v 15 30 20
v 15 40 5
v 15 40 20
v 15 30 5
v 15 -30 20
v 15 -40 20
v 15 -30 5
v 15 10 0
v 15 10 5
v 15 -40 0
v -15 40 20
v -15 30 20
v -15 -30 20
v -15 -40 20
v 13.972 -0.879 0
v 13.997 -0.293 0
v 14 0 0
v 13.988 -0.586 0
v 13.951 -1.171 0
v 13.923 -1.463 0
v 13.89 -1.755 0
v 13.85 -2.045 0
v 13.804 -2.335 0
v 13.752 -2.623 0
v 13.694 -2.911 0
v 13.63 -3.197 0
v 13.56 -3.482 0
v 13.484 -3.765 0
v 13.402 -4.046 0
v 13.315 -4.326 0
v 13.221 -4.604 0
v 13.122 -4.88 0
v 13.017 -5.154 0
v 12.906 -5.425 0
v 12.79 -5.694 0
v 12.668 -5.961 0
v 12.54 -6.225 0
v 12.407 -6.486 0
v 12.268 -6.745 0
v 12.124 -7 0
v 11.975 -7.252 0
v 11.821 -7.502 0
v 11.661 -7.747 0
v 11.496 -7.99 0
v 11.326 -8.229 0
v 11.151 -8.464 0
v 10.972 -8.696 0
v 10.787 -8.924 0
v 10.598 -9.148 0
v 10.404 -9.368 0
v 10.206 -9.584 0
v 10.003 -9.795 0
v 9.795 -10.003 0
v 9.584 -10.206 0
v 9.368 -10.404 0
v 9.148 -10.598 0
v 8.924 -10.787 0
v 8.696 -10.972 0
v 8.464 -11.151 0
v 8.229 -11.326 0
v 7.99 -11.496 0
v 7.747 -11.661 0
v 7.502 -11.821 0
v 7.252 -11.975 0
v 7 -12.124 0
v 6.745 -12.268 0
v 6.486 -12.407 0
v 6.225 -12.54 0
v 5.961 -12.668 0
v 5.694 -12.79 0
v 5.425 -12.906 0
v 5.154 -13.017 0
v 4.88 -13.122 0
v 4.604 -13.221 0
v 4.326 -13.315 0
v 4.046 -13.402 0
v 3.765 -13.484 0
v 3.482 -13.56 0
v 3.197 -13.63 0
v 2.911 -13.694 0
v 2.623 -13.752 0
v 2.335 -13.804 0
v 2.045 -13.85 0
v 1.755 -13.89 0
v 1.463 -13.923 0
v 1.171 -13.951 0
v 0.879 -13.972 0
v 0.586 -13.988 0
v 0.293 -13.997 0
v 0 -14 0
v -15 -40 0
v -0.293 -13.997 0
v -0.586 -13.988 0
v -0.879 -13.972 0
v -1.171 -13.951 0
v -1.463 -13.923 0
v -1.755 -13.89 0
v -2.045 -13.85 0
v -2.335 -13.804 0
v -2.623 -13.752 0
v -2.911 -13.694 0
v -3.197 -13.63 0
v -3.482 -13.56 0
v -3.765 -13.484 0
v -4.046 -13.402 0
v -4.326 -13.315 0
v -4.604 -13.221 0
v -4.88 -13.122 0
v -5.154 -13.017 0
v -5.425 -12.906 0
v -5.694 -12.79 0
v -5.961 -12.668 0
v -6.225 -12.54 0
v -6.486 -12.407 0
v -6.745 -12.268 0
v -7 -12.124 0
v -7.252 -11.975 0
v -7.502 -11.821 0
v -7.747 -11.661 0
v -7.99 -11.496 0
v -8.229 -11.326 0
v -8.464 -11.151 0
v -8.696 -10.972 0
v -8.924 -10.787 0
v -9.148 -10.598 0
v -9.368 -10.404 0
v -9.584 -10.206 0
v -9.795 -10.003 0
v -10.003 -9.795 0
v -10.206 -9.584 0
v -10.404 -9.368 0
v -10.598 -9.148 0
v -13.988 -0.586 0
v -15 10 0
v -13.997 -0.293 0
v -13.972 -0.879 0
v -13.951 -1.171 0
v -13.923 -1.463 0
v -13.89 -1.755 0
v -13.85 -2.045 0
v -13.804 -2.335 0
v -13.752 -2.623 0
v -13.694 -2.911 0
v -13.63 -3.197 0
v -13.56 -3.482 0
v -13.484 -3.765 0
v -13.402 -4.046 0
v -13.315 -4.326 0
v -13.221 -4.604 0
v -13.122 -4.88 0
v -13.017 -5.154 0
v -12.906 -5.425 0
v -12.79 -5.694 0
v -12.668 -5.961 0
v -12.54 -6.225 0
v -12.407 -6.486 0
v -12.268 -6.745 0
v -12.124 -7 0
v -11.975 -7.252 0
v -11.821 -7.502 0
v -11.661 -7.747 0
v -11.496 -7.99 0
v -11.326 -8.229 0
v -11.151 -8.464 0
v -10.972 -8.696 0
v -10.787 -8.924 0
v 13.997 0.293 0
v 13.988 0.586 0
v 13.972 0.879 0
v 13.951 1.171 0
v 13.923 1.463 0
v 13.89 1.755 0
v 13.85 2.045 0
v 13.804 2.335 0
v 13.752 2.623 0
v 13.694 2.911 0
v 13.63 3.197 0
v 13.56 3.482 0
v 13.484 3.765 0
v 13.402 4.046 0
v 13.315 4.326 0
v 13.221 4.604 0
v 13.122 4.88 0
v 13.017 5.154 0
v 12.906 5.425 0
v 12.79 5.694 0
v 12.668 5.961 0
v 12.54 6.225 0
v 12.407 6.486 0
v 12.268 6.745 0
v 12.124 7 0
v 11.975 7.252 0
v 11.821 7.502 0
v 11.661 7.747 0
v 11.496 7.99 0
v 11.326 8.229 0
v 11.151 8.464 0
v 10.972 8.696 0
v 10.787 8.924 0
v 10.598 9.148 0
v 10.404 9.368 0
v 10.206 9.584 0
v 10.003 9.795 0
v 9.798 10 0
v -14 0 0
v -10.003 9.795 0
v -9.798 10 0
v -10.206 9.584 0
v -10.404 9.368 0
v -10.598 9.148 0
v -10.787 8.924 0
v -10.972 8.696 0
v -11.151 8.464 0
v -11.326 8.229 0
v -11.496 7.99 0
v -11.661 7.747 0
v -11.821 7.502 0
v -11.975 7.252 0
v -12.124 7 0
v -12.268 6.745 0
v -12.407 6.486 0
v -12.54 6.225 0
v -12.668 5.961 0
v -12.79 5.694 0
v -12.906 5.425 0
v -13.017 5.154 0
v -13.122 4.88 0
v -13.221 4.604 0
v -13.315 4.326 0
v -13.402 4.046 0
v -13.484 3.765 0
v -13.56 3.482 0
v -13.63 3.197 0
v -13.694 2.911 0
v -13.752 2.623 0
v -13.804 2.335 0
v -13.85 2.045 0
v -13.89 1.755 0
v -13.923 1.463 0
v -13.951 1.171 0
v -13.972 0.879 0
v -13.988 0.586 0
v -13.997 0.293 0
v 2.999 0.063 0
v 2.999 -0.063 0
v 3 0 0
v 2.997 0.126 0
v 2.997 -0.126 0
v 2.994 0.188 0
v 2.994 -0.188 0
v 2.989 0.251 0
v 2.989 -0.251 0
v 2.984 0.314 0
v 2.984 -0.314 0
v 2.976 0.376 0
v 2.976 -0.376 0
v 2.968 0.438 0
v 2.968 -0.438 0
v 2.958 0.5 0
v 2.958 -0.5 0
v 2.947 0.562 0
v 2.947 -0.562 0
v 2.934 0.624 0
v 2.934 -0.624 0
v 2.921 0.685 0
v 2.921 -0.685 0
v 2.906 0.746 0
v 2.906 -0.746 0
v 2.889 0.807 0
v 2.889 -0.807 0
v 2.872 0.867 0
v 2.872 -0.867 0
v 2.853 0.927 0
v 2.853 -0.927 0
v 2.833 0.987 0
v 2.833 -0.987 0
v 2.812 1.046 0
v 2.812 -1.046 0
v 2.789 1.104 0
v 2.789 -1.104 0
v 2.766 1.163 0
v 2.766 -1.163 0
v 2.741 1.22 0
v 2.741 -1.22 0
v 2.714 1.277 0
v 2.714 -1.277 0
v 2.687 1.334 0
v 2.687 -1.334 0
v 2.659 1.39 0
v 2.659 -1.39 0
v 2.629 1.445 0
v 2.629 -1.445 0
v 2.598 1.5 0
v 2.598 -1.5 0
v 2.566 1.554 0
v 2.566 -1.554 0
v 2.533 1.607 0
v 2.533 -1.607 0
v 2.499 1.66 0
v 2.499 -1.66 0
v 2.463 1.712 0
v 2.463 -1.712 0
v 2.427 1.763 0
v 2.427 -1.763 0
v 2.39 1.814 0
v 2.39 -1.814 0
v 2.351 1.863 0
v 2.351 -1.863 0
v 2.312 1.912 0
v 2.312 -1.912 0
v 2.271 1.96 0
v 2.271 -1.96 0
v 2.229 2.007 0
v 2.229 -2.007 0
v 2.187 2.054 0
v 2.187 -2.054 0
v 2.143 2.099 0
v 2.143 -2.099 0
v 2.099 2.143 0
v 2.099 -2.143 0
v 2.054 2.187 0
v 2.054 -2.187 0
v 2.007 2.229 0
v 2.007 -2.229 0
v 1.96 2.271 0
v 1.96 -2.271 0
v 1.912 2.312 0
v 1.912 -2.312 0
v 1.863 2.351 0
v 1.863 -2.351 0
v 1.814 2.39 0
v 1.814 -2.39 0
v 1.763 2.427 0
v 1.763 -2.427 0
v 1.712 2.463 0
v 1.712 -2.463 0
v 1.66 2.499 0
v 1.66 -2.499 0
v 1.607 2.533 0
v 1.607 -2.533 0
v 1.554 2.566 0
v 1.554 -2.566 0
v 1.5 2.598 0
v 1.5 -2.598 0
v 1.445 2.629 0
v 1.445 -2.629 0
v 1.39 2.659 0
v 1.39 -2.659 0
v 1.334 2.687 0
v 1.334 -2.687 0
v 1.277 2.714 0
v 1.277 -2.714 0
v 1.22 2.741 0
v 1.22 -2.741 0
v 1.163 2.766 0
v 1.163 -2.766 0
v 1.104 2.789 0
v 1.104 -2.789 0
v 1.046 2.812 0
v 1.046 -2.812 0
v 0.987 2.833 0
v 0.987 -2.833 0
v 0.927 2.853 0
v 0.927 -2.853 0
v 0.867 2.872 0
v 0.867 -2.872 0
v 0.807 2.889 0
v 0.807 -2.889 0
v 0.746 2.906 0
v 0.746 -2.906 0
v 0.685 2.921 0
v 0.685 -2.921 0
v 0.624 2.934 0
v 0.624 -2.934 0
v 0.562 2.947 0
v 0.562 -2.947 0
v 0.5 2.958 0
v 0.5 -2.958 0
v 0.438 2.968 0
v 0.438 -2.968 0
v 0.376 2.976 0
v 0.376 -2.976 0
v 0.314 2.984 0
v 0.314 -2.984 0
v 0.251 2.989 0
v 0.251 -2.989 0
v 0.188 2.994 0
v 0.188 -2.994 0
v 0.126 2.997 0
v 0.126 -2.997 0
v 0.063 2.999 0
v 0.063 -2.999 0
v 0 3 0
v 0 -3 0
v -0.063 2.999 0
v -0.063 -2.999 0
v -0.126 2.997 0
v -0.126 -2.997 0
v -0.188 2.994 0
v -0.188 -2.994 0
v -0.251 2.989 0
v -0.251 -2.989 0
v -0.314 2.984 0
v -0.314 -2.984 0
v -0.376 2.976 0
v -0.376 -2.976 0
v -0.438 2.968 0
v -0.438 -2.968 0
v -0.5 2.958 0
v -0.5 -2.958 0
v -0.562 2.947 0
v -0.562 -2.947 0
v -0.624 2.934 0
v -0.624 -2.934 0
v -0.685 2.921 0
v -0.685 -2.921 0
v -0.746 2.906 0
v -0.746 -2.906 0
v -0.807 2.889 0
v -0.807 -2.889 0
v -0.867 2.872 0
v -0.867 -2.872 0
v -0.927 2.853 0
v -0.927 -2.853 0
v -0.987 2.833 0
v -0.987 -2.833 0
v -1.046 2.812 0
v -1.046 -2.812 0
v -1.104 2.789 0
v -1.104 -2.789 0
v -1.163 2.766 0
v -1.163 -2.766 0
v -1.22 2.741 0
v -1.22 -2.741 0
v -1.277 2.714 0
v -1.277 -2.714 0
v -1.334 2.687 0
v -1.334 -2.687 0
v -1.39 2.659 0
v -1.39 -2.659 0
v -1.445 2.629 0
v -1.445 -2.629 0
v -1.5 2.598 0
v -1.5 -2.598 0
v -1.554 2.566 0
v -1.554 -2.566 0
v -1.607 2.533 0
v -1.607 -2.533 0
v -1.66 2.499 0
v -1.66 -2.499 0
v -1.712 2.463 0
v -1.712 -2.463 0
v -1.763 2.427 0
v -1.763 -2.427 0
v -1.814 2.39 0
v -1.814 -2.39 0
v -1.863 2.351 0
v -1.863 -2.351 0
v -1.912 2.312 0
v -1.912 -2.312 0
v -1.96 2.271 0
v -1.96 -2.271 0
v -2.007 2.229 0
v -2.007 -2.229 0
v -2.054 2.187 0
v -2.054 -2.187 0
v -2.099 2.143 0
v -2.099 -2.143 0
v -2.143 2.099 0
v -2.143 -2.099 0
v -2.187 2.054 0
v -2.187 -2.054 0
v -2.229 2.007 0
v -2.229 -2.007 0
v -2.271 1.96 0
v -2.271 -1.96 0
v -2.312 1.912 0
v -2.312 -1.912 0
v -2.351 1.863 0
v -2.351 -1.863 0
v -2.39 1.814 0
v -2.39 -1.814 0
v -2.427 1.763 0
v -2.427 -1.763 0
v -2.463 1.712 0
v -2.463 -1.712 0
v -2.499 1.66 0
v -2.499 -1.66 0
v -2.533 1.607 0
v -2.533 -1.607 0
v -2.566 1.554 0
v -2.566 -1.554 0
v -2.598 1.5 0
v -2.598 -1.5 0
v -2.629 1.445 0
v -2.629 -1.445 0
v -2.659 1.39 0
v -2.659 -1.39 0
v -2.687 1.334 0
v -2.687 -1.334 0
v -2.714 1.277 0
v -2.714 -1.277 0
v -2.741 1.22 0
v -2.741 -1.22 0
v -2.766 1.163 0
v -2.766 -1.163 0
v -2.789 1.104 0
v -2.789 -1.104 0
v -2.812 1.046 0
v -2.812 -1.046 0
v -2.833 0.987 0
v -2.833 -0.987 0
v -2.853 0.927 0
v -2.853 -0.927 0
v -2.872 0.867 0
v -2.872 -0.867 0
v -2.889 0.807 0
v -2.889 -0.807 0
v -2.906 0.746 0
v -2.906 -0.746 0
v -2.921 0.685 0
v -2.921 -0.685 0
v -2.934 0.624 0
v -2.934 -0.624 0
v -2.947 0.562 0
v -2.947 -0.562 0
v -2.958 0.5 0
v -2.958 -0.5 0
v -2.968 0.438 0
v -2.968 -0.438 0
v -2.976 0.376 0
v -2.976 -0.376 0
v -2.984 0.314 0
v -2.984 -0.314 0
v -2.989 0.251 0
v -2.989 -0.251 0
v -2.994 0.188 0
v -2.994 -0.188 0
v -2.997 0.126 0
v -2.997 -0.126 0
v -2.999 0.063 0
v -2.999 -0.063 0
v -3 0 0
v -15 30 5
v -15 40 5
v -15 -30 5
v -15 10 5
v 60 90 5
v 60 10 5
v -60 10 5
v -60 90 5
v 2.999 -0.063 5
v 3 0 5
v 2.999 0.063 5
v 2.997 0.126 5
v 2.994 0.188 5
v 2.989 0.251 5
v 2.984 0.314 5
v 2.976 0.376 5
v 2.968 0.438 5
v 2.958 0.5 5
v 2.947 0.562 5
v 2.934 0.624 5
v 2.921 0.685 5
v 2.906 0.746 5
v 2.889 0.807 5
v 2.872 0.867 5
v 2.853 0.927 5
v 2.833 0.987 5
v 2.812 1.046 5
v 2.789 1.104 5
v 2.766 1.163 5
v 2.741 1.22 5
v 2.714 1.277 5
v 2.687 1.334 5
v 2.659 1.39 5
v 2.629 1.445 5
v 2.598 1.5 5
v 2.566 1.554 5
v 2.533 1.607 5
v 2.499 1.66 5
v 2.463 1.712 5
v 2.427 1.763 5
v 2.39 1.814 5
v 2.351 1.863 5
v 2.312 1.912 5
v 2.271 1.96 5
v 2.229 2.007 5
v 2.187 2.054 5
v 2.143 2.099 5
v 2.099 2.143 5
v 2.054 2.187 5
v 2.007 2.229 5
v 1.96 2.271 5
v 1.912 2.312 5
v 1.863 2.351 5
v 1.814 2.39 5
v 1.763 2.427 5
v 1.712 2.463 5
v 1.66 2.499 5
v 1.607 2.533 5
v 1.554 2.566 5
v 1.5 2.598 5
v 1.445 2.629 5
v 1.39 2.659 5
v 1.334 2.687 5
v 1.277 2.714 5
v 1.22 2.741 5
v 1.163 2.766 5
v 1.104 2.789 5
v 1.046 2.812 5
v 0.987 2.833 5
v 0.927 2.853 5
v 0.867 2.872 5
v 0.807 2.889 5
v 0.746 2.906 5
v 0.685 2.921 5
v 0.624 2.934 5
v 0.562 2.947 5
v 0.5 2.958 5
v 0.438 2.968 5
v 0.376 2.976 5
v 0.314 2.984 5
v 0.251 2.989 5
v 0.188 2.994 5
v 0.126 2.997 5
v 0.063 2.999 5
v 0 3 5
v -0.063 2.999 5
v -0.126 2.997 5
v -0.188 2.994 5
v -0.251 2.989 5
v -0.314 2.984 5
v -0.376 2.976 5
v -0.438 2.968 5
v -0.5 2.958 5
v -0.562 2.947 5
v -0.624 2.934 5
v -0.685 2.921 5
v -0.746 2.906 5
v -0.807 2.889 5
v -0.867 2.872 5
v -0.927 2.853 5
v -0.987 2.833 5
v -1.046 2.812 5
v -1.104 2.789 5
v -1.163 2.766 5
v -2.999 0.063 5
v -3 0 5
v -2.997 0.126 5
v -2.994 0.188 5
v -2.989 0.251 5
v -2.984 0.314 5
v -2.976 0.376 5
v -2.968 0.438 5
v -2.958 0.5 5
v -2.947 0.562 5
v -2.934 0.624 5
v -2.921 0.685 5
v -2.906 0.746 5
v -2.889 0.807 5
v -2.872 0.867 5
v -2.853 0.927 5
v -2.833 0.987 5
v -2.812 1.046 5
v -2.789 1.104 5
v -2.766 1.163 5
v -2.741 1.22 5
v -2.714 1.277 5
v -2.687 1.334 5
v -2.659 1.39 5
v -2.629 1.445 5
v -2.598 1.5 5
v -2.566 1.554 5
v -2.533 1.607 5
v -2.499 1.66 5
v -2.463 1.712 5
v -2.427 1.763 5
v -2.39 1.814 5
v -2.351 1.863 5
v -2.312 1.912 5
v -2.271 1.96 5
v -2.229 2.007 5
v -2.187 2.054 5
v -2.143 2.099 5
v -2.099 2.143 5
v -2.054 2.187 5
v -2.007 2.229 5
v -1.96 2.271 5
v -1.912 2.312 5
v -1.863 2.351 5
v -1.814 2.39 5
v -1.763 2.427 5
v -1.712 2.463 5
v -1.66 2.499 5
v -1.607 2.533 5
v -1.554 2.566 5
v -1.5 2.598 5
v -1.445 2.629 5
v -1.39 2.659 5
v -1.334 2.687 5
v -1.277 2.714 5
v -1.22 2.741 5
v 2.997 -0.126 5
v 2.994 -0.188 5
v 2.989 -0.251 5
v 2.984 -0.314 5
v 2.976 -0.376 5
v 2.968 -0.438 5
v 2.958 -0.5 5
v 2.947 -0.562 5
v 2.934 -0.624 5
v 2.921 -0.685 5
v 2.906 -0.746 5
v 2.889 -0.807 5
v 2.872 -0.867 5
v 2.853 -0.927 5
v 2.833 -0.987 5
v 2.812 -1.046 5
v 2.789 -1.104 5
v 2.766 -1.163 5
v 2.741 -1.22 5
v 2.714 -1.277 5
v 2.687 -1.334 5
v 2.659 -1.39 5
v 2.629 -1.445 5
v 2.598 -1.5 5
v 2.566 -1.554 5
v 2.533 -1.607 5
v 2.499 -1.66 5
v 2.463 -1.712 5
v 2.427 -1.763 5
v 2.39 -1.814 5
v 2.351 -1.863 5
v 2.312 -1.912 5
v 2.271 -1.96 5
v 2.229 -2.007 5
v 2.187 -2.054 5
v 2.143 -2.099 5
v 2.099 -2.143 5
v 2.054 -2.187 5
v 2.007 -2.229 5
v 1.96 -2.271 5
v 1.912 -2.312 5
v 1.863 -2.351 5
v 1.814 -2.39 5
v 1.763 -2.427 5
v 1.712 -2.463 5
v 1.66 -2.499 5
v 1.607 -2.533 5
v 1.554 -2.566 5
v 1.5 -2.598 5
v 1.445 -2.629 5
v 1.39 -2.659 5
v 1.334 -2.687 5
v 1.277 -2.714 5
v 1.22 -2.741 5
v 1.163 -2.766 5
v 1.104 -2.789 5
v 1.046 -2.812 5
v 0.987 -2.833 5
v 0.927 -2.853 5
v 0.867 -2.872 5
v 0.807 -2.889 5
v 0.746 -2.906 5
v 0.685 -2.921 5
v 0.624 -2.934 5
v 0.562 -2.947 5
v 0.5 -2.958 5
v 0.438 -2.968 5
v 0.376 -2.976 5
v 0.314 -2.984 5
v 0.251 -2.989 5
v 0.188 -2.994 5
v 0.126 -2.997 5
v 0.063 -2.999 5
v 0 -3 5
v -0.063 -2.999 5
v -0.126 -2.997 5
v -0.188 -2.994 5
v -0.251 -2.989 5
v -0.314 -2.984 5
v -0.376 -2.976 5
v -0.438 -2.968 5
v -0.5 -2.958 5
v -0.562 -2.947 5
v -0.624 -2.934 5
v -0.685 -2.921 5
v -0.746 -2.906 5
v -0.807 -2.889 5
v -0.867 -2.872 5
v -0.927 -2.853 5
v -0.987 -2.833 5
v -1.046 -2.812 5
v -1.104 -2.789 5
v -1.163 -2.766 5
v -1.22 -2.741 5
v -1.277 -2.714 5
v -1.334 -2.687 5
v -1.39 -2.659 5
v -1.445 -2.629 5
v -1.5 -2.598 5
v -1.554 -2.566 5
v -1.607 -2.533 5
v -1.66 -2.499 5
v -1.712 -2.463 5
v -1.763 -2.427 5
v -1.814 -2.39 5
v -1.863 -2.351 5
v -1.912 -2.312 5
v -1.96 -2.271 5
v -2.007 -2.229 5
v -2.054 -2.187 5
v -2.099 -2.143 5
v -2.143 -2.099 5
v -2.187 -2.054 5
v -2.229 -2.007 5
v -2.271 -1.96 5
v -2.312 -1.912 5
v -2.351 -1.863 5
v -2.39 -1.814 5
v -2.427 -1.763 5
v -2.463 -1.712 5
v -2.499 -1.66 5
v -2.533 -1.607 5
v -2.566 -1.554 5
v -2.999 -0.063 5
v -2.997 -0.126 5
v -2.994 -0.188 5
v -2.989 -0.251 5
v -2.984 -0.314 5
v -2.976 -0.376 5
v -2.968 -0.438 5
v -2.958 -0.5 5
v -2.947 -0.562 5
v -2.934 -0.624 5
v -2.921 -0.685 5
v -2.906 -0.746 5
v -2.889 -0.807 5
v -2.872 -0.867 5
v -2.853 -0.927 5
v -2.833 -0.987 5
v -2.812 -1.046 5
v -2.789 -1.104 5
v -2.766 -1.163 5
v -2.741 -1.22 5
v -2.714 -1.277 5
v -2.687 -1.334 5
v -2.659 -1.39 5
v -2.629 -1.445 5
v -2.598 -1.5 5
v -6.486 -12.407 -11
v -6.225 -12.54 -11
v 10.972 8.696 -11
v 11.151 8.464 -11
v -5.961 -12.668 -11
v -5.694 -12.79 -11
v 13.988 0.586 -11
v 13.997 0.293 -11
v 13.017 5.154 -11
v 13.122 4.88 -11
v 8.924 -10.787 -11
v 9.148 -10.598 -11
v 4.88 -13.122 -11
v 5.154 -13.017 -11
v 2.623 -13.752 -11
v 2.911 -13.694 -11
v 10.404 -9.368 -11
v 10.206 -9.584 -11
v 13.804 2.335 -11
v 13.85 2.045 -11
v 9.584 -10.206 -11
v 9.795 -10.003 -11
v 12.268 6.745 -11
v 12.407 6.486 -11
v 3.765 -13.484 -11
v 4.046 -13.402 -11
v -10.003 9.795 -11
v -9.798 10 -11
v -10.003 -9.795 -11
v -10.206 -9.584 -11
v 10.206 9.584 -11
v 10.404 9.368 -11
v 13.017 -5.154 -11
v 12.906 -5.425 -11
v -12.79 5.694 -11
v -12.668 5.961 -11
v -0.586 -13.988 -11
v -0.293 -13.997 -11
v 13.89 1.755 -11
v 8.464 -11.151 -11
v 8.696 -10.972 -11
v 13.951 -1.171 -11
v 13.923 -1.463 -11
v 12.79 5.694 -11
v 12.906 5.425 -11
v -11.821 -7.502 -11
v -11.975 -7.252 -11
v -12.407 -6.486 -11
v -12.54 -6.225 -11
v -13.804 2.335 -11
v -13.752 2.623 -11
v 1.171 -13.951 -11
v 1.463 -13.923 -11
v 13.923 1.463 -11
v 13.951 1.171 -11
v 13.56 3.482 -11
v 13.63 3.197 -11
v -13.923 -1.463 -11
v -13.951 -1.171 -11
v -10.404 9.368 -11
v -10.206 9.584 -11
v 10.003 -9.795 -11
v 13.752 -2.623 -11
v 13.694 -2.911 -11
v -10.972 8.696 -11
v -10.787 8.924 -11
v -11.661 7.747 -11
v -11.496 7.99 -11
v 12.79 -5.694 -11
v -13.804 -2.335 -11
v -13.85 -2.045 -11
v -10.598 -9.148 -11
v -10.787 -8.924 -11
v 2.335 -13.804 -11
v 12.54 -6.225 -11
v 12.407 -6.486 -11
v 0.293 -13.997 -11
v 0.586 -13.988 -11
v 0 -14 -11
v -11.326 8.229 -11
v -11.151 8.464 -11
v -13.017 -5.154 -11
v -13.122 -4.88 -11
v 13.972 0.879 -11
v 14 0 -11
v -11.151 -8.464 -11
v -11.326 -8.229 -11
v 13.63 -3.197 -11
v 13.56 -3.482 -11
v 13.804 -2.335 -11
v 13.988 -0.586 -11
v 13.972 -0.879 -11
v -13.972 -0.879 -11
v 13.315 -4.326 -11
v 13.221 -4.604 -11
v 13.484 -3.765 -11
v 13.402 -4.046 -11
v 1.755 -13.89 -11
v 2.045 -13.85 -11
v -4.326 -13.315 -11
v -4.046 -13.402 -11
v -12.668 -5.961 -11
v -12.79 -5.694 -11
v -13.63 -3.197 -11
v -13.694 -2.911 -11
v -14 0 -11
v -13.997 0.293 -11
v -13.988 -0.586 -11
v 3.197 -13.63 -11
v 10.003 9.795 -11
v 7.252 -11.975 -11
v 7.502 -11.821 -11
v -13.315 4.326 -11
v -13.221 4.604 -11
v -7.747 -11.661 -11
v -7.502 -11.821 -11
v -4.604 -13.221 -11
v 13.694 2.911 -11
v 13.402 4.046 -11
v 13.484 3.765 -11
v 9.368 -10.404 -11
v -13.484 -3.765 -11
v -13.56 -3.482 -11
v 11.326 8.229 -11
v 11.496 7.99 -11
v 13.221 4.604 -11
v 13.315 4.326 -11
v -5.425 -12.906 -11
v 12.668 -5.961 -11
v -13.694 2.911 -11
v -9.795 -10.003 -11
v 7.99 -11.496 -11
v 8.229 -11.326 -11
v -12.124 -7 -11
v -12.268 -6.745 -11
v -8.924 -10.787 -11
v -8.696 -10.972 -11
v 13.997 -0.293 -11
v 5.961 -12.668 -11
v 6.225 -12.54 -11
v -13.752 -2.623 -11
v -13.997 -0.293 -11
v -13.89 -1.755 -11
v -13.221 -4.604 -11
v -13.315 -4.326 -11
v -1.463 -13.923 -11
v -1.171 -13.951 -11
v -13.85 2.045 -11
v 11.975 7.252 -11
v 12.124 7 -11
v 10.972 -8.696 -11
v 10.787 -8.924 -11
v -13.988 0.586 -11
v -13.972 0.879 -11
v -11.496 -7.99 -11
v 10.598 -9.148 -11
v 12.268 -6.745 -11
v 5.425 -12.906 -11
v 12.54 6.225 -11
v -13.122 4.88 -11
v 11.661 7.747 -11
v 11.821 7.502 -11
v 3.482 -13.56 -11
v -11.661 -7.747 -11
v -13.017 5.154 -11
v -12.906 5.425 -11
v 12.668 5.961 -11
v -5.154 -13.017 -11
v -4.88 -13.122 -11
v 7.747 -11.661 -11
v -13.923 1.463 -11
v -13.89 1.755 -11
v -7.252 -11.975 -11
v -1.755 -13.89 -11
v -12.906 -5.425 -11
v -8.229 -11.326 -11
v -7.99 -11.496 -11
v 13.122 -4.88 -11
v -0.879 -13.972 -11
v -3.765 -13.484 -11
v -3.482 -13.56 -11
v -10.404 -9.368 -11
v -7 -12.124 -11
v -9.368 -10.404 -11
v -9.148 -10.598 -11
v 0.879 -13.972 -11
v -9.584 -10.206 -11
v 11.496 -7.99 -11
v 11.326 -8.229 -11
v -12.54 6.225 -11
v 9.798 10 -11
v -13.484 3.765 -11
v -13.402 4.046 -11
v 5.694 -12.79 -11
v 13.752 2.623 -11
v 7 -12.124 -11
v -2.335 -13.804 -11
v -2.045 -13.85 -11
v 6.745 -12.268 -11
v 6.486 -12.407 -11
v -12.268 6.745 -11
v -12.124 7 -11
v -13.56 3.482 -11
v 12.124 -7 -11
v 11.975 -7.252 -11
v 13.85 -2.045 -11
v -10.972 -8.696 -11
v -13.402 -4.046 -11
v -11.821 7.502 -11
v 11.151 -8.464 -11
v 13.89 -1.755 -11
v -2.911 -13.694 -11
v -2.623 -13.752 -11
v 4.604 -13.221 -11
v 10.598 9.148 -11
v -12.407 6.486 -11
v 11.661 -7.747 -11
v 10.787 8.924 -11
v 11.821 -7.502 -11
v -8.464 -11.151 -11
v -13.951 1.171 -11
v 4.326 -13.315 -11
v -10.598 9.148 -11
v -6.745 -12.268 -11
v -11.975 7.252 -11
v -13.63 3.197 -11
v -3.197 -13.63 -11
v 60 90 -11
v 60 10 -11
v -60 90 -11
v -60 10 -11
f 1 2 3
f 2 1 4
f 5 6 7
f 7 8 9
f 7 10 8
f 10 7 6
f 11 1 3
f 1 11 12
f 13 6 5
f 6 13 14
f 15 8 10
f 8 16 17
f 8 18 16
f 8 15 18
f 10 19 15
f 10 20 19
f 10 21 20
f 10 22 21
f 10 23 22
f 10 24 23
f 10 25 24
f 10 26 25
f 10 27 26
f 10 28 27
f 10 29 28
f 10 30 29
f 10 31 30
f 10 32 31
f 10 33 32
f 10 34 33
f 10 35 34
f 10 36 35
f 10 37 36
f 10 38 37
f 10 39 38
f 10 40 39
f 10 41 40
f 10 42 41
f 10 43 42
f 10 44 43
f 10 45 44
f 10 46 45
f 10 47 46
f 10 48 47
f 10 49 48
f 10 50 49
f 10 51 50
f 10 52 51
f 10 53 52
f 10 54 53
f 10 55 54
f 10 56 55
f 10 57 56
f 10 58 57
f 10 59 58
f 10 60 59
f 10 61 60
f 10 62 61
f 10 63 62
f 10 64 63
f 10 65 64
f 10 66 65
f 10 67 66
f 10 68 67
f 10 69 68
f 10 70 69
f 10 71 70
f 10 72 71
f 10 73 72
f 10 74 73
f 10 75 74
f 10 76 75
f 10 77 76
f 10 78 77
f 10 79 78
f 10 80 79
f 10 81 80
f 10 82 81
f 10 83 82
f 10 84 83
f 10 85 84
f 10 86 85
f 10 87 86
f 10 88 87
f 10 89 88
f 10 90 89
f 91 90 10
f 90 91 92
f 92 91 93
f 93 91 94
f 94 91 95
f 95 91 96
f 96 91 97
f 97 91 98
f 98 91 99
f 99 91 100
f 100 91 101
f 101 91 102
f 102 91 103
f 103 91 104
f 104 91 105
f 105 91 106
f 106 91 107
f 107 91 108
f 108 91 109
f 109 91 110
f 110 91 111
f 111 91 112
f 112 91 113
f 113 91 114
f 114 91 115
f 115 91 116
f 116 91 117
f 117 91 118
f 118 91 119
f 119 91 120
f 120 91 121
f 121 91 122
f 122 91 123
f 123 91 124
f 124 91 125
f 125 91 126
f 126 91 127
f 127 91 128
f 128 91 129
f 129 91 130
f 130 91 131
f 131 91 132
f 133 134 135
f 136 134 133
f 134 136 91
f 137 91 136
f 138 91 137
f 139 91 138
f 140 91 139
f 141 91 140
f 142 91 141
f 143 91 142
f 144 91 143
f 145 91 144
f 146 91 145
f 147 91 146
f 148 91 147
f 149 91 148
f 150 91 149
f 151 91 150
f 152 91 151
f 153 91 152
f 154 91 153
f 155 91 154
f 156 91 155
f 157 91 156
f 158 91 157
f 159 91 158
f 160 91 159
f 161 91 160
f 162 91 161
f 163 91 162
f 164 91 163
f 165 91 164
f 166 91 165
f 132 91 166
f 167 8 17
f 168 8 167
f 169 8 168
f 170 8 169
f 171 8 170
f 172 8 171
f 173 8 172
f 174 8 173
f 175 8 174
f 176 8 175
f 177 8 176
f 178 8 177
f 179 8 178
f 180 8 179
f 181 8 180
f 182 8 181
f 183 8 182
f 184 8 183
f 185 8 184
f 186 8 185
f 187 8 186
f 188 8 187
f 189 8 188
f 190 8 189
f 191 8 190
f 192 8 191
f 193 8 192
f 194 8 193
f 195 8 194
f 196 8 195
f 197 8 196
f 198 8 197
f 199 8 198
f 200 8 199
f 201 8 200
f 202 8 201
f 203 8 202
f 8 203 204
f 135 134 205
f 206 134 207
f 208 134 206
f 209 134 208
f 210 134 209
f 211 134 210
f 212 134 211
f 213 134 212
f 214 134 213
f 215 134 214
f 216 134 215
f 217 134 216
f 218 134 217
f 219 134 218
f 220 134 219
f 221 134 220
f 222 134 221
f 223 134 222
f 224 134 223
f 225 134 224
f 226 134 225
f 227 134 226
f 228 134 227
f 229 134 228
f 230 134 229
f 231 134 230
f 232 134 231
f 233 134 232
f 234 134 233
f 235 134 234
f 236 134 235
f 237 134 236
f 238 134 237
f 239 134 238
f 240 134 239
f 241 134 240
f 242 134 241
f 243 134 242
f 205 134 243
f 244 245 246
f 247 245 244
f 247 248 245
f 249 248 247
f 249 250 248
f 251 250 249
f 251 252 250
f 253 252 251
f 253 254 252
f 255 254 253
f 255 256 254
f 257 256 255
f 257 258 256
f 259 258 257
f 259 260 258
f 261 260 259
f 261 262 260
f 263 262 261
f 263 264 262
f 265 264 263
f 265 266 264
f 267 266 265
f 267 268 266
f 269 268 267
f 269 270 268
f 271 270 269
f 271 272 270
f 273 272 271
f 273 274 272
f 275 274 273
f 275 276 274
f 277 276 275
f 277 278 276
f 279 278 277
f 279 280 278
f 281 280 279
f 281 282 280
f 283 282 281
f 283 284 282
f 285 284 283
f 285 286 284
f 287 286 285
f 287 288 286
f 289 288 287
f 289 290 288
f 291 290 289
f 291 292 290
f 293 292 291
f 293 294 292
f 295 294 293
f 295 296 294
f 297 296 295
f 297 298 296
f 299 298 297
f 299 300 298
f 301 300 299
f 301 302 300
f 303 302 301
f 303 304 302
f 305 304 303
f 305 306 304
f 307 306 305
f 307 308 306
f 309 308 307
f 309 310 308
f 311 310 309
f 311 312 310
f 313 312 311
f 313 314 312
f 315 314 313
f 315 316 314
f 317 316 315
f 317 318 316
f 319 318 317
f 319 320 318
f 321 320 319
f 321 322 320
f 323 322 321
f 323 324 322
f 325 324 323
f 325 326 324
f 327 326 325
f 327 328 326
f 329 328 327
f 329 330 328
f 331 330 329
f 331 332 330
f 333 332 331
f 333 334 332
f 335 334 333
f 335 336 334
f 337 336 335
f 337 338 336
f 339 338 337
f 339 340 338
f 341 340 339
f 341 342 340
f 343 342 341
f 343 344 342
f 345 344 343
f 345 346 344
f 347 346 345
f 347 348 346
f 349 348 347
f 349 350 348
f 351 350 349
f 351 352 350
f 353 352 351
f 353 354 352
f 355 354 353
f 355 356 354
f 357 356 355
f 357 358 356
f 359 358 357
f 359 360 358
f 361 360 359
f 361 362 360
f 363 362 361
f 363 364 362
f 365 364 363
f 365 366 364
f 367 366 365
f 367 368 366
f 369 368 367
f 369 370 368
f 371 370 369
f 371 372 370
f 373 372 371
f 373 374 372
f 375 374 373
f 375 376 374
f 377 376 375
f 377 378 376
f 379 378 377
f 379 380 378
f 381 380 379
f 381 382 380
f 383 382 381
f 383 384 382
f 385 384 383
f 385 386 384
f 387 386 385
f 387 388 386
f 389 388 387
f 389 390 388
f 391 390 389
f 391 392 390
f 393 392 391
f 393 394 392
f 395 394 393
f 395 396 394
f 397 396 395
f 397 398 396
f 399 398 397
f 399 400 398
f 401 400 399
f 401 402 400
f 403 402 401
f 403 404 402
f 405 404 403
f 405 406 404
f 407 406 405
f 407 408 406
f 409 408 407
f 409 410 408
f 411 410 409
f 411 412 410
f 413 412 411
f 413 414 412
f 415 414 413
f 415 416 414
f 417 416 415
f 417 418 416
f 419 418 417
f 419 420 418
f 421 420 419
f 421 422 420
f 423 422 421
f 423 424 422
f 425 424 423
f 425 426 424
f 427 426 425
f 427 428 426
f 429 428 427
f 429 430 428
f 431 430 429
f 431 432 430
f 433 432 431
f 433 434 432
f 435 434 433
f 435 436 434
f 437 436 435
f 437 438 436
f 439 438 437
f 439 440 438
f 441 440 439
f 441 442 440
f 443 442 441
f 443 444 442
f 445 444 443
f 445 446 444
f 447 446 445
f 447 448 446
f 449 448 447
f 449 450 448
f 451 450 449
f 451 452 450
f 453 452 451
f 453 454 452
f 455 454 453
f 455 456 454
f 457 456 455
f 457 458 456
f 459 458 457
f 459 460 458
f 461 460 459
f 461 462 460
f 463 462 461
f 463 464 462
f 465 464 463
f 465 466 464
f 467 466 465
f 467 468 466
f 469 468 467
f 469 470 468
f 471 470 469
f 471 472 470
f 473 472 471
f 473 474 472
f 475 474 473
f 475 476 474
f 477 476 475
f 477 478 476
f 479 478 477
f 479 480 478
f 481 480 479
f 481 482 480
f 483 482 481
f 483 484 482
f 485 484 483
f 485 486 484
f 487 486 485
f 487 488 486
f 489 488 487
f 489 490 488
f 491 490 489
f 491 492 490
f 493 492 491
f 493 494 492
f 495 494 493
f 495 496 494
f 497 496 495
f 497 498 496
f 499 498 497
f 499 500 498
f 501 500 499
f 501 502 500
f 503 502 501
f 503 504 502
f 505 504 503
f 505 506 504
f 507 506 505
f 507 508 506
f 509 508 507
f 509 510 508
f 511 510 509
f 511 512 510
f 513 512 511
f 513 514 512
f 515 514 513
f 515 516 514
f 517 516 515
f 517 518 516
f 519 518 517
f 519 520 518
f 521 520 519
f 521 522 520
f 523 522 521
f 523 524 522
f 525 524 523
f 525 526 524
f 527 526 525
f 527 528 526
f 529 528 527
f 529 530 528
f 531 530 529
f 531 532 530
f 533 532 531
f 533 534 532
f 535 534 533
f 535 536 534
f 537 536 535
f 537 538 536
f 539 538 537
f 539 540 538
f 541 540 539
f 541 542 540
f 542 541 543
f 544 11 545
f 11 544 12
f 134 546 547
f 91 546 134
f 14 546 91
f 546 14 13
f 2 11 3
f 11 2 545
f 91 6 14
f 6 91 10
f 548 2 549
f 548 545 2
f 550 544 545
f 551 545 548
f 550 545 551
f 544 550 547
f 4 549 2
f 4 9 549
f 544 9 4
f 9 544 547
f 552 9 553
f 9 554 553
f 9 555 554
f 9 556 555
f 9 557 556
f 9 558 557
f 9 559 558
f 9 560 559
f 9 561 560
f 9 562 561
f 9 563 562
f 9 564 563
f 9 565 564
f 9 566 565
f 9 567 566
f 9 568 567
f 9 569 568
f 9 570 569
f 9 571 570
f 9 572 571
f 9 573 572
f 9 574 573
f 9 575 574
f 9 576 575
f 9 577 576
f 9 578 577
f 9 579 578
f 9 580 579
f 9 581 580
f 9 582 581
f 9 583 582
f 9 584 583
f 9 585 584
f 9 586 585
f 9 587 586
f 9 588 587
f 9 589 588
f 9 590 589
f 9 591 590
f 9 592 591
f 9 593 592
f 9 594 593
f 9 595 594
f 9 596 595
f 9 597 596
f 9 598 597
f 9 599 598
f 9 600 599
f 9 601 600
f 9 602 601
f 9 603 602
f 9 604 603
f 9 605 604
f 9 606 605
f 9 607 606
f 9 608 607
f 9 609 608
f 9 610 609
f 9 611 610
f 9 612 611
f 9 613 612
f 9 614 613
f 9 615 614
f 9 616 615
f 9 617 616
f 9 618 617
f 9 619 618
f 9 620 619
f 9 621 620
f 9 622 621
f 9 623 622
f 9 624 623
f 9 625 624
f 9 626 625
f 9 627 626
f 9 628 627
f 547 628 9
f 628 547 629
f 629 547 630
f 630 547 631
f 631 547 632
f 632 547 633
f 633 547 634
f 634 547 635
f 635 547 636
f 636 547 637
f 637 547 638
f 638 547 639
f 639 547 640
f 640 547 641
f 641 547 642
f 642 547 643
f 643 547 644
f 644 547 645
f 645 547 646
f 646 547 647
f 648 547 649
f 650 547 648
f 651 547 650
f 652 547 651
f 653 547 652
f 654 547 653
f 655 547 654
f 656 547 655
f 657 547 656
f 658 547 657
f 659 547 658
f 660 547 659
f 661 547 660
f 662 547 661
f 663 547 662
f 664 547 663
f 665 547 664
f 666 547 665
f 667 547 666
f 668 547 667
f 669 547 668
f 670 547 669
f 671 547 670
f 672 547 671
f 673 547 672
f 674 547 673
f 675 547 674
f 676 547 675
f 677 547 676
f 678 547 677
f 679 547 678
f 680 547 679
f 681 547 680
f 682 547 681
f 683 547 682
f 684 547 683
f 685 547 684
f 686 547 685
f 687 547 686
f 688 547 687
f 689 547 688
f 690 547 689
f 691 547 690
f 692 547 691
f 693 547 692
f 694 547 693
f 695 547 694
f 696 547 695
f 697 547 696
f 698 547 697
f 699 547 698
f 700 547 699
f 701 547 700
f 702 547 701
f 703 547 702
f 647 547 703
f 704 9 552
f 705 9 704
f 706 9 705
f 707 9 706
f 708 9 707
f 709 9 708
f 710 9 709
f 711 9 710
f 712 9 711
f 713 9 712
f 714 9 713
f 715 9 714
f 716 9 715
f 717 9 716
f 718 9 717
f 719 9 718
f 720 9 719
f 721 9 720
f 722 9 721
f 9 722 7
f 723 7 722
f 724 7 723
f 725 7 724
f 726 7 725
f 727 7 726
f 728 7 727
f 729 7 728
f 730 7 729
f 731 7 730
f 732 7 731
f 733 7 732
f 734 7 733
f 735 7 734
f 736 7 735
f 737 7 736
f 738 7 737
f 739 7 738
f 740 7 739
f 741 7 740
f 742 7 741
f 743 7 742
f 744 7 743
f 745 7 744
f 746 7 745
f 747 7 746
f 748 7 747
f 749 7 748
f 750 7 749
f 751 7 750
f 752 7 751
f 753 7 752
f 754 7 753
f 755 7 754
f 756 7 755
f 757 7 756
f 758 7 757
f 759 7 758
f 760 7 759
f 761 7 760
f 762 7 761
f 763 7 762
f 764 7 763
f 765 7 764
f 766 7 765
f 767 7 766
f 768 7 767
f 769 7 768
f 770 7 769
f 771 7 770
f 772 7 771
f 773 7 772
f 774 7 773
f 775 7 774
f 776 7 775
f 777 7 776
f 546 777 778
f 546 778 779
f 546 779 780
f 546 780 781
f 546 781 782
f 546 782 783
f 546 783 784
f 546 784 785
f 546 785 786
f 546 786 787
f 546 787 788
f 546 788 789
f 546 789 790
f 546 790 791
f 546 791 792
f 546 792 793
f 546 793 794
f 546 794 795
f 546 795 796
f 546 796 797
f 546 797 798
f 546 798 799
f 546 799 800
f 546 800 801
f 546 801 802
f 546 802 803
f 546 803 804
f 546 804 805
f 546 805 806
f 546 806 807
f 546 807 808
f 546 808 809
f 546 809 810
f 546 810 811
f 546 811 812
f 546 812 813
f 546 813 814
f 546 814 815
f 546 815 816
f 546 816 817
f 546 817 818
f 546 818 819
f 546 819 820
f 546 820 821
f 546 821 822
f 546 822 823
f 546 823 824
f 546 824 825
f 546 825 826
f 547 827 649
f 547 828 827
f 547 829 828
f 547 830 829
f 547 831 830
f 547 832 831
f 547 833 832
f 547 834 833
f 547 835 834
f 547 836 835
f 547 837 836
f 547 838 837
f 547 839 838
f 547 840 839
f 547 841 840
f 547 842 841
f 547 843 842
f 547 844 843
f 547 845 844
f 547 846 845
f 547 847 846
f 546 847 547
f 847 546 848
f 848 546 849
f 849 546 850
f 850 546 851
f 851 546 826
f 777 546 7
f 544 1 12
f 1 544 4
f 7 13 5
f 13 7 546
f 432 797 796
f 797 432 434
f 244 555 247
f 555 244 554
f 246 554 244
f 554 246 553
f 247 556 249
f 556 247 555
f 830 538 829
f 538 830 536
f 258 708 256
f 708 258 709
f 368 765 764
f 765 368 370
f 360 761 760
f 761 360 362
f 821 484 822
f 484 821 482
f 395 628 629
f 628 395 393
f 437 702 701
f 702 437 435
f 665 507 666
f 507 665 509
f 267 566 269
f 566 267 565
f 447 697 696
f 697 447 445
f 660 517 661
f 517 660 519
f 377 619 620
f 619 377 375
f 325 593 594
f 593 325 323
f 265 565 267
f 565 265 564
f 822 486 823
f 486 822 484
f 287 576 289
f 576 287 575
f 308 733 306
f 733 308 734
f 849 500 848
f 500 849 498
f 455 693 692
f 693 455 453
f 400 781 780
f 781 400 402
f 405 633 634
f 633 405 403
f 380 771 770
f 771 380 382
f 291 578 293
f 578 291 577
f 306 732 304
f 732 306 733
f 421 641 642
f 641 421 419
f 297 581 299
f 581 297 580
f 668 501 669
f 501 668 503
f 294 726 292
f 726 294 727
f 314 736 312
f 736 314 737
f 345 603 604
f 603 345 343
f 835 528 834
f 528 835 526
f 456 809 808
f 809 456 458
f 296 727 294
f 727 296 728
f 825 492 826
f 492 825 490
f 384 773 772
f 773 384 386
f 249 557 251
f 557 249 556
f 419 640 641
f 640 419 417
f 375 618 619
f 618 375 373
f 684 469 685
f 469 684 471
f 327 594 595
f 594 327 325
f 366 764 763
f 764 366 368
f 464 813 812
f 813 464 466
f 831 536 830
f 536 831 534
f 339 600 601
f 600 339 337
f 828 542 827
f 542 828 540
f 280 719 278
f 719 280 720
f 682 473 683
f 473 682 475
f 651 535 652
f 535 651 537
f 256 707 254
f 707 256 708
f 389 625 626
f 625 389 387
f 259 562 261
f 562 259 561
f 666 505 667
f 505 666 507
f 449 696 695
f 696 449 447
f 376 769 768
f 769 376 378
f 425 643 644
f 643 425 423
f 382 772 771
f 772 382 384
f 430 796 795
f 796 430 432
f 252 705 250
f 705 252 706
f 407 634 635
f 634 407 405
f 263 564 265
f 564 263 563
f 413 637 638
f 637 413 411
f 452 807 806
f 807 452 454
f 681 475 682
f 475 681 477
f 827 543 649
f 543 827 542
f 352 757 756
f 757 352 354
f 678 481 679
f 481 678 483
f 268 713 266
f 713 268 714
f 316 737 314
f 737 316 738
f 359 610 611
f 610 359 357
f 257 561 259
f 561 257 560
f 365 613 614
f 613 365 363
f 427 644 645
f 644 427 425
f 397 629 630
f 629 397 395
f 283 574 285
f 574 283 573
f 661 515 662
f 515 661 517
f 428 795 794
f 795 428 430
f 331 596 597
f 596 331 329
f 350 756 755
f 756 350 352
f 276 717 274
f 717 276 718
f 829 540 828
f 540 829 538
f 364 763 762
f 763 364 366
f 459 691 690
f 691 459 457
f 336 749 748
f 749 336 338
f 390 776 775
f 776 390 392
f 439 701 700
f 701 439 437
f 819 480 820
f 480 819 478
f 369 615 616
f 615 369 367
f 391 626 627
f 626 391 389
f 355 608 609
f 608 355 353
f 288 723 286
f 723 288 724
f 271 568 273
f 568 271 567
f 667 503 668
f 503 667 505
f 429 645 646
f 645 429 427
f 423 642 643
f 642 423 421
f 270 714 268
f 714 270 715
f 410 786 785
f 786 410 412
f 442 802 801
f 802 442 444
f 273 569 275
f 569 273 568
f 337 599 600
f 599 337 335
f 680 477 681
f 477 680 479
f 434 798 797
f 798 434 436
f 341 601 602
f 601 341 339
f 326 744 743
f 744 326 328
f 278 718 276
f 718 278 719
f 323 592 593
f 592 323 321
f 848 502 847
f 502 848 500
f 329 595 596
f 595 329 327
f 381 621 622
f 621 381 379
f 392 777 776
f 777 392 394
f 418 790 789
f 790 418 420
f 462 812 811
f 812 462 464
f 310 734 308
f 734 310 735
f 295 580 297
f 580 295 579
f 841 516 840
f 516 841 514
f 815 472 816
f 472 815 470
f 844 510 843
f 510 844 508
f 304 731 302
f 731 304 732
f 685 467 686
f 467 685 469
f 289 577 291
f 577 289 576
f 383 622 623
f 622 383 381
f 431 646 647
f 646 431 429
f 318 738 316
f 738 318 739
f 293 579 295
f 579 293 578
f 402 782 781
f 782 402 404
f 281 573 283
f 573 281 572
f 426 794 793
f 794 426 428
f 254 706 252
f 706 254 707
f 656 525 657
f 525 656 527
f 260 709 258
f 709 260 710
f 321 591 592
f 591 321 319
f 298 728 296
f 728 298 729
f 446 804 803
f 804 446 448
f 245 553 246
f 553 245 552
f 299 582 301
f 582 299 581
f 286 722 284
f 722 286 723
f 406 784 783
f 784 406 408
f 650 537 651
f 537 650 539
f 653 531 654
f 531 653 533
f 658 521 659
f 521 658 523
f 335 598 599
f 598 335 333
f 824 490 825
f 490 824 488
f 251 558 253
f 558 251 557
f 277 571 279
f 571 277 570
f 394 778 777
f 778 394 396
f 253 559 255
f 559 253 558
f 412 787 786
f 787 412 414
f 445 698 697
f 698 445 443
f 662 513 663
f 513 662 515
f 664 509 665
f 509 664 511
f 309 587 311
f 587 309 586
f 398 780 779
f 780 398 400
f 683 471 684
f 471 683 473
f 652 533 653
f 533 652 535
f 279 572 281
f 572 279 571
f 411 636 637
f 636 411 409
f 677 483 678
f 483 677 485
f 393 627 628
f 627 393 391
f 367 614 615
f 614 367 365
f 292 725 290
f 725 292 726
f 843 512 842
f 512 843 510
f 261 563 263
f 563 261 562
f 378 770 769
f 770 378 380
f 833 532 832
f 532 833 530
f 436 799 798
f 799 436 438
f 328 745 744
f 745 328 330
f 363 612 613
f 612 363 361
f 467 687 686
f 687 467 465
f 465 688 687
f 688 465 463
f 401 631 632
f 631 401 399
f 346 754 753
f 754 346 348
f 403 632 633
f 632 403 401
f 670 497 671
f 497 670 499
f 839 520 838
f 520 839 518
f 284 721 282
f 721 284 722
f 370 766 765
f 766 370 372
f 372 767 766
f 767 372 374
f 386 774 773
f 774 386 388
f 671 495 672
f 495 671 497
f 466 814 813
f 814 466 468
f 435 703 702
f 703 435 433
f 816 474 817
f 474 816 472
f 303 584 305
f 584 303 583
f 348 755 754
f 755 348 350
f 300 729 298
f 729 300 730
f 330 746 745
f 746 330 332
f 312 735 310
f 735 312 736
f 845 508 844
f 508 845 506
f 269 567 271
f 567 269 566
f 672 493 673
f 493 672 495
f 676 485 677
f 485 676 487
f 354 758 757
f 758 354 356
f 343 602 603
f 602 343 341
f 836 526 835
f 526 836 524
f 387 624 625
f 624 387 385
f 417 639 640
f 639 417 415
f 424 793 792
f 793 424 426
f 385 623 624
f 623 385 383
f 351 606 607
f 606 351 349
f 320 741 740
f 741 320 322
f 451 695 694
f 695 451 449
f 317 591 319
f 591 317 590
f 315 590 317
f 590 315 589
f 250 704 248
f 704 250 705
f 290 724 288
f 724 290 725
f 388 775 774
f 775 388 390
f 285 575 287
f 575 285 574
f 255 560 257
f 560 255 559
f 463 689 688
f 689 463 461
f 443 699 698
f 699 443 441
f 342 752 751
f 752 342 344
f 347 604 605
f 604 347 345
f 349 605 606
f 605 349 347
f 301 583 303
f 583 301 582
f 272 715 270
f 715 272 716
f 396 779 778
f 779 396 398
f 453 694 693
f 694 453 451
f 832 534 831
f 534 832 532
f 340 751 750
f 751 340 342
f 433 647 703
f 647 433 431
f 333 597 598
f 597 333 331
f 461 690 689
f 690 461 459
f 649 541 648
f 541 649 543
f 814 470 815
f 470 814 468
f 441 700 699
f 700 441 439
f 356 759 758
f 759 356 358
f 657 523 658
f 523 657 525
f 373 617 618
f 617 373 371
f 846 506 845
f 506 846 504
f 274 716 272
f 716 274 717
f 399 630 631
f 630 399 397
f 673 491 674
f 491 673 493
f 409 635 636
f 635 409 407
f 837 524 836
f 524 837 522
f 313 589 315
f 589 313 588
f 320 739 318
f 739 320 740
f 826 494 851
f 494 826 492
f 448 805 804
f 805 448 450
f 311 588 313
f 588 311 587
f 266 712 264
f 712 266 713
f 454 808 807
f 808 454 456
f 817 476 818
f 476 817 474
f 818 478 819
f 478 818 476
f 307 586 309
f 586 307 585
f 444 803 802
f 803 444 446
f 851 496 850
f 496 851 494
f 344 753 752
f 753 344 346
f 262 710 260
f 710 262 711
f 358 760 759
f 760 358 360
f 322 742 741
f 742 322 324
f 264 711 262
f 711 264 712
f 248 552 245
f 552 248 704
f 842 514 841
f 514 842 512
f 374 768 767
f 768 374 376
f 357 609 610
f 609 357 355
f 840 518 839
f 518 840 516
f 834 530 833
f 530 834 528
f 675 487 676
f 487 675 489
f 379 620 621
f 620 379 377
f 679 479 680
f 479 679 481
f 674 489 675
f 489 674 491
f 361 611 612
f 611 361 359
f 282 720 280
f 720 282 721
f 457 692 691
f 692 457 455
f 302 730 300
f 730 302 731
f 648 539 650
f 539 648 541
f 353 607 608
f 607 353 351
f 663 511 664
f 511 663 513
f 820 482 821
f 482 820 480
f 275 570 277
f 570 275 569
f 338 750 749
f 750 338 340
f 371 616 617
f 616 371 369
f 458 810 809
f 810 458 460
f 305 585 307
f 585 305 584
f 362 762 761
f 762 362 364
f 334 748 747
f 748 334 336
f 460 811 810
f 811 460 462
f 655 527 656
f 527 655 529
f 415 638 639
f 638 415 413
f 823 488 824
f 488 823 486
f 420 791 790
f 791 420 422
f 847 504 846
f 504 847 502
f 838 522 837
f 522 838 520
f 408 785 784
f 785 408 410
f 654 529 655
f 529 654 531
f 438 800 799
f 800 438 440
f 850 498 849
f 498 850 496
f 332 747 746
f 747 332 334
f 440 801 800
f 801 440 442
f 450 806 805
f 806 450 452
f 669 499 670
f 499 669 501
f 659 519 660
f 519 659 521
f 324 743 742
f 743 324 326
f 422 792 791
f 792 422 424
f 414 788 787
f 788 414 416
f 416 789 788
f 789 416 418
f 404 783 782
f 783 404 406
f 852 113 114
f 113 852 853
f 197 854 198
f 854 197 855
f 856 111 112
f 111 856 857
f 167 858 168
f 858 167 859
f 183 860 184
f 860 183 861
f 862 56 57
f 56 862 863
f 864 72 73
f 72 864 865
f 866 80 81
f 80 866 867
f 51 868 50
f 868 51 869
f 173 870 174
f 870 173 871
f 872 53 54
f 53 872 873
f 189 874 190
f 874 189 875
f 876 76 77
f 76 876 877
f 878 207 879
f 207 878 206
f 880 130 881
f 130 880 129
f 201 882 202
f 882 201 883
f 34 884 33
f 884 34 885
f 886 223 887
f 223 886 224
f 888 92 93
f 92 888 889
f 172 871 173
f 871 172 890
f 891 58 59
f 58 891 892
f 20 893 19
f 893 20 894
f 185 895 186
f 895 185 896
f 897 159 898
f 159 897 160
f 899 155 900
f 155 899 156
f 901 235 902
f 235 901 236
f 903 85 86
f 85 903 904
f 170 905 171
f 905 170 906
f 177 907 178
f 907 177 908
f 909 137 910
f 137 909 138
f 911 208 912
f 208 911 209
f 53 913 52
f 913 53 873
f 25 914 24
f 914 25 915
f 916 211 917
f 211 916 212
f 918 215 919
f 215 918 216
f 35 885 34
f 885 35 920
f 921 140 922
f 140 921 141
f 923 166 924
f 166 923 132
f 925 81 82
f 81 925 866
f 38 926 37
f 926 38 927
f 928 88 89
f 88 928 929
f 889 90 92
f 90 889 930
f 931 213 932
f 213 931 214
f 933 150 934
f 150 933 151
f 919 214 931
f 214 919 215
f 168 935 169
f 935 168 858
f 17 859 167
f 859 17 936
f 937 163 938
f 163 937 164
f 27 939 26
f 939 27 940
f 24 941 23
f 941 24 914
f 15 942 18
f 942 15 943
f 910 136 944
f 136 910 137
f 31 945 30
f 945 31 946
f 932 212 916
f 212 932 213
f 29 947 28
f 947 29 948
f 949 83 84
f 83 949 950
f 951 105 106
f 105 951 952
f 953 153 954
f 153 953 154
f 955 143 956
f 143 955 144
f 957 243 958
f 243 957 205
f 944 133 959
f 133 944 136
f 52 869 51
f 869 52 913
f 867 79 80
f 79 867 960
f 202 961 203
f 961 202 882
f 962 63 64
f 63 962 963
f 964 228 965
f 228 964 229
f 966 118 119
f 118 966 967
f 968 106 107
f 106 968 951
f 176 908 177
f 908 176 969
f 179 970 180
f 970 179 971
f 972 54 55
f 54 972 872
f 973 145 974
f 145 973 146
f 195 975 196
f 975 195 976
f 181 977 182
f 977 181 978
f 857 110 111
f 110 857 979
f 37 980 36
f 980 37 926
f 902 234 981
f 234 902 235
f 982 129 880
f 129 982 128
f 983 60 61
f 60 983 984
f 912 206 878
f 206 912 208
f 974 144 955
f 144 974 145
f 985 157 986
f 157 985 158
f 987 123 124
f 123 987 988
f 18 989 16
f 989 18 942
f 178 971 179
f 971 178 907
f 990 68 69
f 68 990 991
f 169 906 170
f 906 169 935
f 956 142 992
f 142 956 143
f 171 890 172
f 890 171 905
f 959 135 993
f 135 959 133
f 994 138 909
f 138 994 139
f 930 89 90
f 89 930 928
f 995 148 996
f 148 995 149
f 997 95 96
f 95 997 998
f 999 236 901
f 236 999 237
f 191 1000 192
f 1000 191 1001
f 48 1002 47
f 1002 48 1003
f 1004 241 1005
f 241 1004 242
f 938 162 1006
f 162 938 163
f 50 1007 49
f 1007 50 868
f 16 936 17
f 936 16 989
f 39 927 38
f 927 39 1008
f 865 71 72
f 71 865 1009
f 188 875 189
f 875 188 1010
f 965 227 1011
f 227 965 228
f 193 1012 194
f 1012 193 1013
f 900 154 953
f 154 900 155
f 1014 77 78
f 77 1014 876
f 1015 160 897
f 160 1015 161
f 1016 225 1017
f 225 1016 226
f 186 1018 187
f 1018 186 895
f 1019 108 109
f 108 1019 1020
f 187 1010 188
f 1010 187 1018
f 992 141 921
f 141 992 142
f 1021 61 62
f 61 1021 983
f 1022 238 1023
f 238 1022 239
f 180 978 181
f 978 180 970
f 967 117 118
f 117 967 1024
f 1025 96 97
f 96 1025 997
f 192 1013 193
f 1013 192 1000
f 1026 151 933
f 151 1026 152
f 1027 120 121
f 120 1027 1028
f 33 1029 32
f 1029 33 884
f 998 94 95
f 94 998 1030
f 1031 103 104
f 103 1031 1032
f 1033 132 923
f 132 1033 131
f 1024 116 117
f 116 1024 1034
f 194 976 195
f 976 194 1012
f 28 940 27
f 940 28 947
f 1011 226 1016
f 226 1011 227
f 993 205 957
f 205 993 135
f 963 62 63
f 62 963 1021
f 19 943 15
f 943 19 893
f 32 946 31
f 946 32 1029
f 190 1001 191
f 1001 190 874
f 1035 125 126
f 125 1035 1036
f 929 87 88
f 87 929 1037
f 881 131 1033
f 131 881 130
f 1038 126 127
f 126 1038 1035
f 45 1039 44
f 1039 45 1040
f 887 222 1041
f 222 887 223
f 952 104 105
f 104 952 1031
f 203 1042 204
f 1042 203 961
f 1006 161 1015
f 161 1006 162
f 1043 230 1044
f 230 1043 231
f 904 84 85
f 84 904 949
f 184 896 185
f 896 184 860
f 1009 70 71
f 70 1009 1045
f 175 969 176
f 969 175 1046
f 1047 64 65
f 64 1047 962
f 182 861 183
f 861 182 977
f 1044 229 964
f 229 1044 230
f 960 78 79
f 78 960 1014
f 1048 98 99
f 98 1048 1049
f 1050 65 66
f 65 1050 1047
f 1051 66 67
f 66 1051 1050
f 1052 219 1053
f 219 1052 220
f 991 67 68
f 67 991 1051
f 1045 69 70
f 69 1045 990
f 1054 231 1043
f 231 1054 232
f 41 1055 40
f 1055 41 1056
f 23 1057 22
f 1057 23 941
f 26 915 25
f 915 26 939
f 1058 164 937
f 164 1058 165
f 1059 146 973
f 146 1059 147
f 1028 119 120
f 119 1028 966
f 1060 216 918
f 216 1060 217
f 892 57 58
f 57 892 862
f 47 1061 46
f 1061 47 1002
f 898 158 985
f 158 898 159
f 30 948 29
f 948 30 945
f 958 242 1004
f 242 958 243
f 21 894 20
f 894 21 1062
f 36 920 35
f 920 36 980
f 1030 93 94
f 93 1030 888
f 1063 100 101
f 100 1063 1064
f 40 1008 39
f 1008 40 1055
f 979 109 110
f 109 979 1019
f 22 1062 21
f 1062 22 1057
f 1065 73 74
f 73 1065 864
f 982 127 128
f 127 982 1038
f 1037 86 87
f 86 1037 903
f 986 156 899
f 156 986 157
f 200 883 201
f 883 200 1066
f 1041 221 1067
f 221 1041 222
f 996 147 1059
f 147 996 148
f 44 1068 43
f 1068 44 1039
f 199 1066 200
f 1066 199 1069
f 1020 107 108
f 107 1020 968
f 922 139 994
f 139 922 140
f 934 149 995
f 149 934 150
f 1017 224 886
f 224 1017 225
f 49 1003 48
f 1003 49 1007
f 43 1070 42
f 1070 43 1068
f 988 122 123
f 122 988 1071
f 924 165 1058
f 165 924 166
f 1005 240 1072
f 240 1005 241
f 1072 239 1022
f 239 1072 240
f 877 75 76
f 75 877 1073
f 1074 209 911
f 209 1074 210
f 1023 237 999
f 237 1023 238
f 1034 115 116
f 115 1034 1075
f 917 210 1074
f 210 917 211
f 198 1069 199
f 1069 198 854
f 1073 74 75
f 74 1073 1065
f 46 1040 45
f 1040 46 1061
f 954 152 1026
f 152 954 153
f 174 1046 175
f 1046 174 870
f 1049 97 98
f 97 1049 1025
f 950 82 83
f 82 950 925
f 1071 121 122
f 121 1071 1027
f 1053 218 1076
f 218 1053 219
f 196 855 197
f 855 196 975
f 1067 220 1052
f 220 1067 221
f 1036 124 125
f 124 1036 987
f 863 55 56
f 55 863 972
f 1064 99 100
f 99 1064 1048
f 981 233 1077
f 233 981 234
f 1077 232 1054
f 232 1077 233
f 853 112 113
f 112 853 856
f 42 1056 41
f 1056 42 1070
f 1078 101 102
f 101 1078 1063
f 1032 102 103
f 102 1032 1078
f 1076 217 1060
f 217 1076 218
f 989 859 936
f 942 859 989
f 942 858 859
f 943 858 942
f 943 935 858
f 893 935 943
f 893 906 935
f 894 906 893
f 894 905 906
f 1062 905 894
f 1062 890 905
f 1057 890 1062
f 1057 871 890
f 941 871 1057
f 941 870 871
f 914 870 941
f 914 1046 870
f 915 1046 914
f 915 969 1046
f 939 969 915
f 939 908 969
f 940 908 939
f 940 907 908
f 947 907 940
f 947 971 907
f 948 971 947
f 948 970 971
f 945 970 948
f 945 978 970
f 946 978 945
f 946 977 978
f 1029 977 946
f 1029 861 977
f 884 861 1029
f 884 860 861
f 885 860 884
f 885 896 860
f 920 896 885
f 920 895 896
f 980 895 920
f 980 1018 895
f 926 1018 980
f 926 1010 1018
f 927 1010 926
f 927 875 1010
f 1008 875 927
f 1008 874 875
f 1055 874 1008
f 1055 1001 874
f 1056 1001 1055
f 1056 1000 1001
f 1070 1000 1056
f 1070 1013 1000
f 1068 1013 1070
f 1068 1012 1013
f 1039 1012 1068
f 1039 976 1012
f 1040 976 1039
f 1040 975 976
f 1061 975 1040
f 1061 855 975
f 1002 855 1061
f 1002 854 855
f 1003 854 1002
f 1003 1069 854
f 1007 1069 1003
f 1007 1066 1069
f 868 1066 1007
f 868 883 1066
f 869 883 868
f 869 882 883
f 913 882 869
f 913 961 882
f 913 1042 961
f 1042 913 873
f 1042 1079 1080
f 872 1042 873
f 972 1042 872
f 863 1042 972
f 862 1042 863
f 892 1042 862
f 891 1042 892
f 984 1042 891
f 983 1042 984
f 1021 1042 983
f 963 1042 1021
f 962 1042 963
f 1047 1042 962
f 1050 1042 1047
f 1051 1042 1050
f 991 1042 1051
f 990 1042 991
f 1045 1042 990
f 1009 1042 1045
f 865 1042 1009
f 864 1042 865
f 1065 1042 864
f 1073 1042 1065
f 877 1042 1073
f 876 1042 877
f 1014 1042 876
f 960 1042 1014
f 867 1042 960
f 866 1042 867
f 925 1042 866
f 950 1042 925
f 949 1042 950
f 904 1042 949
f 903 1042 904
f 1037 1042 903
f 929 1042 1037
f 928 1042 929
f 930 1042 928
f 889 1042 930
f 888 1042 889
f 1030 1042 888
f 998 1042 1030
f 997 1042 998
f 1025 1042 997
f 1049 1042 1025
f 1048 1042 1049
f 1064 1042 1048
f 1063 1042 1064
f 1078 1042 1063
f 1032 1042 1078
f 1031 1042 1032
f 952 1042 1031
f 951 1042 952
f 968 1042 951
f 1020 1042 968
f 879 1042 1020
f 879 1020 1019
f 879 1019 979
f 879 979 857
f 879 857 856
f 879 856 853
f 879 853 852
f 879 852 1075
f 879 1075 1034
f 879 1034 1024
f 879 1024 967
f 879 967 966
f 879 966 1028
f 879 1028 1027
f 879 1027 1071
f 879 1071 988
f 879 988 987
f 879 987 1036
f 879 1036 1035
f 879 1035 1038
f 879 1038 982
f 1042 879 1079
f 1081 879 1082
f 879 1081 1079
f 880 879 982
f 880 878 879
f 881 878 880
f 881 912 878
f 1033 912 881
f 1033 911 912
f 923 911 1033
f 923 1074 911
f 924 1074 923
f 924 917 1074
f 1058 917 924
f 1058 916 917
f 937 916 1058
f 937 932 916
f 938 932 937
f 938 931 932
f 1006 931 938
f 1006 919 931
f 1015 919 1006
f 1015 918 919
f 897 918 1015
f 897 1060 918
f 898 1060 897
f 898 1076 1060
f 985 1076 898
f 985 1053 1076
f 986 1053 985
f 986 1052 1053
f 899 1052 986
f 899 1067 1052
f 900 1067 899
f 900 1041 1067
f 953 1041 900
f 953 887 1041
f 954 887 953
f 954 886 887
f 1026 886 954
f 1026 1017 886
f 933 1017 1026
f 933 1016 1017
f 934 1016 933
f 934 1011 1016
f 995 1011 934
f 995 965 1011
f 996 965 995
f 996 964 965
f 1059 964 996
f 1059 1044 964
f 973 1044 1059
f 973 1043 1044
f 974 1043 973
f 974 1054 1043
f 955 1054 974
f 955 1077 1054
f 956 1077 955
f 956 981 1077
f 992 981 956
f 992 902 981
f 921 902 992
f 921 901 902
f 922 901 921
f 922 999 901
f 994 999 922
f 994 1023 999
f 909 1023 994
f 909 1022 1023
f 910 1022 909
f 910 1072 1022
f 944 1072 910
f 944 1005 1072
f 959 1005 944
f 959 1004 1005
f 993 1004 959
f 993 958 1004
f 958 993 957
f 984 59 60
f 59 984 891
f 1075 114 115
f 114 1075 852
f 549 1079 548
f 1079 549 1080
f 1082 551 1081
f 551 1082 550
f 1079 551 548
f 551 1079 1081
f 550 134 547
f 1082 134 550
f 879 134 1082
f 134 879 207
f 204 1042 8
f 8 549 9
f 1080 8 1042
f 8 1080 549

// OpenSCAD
$fn=300;

create_final_holder = false;


phone_holder_dimensions_mm = [30,80,20];
phone_holder_inner_size_mm = [50,60,15];


screw_threads_mm = 5;
screw_head_height_mm = 5;
screw_head_diameter_mm = 18;
threads_outside_length_mm = 6;


screw_total_height_mm = threads_outside_length_mm + screw_head_height_mm + phone_holder_dimensions_mm[2]-phone_holder_inner_size_mm[2];

hole_diameter_mm = screw_threads_mm+1;


module screw(total_height_mm, threads_mm, head_height_mm, head_diameter_mm)
{
    color("white",1.0)
    union()
    {
        cylinder(h=total_height_mm, d=threads_mm);
        cylinder(h=head_height_mm, d=head_diameter_mm);
    }
}


module phone_holder(outer_size, inner_size, hole_diameter_mm)
{
    hole_length=2*(outer_size[2]-inner_size[2]);
    
    
    {
        difference()
        {
            color("black",1.0)
            difference()
            {
                // holder
                translate([0,0,outer_size[2]/2])
                {
                    cube(outer_size, center=true);
                }
                translate([0,0,phone_holder_inner_size_mm[2]/2+
                phone_holder_dimensions_mm[2]-phone_holder_inner_size_mm[2]])
                {
                    cube(inner_size,center=true);
                }
            }
            {
                translate([0,0,hole_length/2])
                {
                    cylinder(h=hole_length, d=hole_diameter_mm, center=true);
                }
            }
        }
    }
}

module holder_and_screw()
{
    
    phone_holder(phone_holder_dimensions_mm, phone_holder_inner_size_mm, hole_diameter_mm);
    translate([0,0,-(screw_head_height_mm+threads_outside_length_mm)])
    {
    //   screw(screw_total_height_mm, screw_threads_mm, screw_head_height_mm, screw_head_diameter_mm);
    }
    translate([0,0,-(threads_outside_length_mm + screw_head_height_mm)/2])
    {
        cylinder(h=threads_outside_length_mm + screw_head_height_mm, d = screw_head_diameter_mm + 10, center=true);
    }
}

holder_and_screw();



base_height = screw_total_height_mm;

base_whole_cube_size = [phone_holder_dimensions_mm[0]*4, phone_holder_dimensions_mm[1], base_height];

module base(base_size)
{
    translate([0,50,0])
    translate([0,0,-base_size[2]/2])
    cube(base_size, center=true);
}

translate([0,0,phone_holder_dimensions_mm[2]-phone_holder_inner_size_mm[2]])
{
    base(base_whole_cube_size);
}
